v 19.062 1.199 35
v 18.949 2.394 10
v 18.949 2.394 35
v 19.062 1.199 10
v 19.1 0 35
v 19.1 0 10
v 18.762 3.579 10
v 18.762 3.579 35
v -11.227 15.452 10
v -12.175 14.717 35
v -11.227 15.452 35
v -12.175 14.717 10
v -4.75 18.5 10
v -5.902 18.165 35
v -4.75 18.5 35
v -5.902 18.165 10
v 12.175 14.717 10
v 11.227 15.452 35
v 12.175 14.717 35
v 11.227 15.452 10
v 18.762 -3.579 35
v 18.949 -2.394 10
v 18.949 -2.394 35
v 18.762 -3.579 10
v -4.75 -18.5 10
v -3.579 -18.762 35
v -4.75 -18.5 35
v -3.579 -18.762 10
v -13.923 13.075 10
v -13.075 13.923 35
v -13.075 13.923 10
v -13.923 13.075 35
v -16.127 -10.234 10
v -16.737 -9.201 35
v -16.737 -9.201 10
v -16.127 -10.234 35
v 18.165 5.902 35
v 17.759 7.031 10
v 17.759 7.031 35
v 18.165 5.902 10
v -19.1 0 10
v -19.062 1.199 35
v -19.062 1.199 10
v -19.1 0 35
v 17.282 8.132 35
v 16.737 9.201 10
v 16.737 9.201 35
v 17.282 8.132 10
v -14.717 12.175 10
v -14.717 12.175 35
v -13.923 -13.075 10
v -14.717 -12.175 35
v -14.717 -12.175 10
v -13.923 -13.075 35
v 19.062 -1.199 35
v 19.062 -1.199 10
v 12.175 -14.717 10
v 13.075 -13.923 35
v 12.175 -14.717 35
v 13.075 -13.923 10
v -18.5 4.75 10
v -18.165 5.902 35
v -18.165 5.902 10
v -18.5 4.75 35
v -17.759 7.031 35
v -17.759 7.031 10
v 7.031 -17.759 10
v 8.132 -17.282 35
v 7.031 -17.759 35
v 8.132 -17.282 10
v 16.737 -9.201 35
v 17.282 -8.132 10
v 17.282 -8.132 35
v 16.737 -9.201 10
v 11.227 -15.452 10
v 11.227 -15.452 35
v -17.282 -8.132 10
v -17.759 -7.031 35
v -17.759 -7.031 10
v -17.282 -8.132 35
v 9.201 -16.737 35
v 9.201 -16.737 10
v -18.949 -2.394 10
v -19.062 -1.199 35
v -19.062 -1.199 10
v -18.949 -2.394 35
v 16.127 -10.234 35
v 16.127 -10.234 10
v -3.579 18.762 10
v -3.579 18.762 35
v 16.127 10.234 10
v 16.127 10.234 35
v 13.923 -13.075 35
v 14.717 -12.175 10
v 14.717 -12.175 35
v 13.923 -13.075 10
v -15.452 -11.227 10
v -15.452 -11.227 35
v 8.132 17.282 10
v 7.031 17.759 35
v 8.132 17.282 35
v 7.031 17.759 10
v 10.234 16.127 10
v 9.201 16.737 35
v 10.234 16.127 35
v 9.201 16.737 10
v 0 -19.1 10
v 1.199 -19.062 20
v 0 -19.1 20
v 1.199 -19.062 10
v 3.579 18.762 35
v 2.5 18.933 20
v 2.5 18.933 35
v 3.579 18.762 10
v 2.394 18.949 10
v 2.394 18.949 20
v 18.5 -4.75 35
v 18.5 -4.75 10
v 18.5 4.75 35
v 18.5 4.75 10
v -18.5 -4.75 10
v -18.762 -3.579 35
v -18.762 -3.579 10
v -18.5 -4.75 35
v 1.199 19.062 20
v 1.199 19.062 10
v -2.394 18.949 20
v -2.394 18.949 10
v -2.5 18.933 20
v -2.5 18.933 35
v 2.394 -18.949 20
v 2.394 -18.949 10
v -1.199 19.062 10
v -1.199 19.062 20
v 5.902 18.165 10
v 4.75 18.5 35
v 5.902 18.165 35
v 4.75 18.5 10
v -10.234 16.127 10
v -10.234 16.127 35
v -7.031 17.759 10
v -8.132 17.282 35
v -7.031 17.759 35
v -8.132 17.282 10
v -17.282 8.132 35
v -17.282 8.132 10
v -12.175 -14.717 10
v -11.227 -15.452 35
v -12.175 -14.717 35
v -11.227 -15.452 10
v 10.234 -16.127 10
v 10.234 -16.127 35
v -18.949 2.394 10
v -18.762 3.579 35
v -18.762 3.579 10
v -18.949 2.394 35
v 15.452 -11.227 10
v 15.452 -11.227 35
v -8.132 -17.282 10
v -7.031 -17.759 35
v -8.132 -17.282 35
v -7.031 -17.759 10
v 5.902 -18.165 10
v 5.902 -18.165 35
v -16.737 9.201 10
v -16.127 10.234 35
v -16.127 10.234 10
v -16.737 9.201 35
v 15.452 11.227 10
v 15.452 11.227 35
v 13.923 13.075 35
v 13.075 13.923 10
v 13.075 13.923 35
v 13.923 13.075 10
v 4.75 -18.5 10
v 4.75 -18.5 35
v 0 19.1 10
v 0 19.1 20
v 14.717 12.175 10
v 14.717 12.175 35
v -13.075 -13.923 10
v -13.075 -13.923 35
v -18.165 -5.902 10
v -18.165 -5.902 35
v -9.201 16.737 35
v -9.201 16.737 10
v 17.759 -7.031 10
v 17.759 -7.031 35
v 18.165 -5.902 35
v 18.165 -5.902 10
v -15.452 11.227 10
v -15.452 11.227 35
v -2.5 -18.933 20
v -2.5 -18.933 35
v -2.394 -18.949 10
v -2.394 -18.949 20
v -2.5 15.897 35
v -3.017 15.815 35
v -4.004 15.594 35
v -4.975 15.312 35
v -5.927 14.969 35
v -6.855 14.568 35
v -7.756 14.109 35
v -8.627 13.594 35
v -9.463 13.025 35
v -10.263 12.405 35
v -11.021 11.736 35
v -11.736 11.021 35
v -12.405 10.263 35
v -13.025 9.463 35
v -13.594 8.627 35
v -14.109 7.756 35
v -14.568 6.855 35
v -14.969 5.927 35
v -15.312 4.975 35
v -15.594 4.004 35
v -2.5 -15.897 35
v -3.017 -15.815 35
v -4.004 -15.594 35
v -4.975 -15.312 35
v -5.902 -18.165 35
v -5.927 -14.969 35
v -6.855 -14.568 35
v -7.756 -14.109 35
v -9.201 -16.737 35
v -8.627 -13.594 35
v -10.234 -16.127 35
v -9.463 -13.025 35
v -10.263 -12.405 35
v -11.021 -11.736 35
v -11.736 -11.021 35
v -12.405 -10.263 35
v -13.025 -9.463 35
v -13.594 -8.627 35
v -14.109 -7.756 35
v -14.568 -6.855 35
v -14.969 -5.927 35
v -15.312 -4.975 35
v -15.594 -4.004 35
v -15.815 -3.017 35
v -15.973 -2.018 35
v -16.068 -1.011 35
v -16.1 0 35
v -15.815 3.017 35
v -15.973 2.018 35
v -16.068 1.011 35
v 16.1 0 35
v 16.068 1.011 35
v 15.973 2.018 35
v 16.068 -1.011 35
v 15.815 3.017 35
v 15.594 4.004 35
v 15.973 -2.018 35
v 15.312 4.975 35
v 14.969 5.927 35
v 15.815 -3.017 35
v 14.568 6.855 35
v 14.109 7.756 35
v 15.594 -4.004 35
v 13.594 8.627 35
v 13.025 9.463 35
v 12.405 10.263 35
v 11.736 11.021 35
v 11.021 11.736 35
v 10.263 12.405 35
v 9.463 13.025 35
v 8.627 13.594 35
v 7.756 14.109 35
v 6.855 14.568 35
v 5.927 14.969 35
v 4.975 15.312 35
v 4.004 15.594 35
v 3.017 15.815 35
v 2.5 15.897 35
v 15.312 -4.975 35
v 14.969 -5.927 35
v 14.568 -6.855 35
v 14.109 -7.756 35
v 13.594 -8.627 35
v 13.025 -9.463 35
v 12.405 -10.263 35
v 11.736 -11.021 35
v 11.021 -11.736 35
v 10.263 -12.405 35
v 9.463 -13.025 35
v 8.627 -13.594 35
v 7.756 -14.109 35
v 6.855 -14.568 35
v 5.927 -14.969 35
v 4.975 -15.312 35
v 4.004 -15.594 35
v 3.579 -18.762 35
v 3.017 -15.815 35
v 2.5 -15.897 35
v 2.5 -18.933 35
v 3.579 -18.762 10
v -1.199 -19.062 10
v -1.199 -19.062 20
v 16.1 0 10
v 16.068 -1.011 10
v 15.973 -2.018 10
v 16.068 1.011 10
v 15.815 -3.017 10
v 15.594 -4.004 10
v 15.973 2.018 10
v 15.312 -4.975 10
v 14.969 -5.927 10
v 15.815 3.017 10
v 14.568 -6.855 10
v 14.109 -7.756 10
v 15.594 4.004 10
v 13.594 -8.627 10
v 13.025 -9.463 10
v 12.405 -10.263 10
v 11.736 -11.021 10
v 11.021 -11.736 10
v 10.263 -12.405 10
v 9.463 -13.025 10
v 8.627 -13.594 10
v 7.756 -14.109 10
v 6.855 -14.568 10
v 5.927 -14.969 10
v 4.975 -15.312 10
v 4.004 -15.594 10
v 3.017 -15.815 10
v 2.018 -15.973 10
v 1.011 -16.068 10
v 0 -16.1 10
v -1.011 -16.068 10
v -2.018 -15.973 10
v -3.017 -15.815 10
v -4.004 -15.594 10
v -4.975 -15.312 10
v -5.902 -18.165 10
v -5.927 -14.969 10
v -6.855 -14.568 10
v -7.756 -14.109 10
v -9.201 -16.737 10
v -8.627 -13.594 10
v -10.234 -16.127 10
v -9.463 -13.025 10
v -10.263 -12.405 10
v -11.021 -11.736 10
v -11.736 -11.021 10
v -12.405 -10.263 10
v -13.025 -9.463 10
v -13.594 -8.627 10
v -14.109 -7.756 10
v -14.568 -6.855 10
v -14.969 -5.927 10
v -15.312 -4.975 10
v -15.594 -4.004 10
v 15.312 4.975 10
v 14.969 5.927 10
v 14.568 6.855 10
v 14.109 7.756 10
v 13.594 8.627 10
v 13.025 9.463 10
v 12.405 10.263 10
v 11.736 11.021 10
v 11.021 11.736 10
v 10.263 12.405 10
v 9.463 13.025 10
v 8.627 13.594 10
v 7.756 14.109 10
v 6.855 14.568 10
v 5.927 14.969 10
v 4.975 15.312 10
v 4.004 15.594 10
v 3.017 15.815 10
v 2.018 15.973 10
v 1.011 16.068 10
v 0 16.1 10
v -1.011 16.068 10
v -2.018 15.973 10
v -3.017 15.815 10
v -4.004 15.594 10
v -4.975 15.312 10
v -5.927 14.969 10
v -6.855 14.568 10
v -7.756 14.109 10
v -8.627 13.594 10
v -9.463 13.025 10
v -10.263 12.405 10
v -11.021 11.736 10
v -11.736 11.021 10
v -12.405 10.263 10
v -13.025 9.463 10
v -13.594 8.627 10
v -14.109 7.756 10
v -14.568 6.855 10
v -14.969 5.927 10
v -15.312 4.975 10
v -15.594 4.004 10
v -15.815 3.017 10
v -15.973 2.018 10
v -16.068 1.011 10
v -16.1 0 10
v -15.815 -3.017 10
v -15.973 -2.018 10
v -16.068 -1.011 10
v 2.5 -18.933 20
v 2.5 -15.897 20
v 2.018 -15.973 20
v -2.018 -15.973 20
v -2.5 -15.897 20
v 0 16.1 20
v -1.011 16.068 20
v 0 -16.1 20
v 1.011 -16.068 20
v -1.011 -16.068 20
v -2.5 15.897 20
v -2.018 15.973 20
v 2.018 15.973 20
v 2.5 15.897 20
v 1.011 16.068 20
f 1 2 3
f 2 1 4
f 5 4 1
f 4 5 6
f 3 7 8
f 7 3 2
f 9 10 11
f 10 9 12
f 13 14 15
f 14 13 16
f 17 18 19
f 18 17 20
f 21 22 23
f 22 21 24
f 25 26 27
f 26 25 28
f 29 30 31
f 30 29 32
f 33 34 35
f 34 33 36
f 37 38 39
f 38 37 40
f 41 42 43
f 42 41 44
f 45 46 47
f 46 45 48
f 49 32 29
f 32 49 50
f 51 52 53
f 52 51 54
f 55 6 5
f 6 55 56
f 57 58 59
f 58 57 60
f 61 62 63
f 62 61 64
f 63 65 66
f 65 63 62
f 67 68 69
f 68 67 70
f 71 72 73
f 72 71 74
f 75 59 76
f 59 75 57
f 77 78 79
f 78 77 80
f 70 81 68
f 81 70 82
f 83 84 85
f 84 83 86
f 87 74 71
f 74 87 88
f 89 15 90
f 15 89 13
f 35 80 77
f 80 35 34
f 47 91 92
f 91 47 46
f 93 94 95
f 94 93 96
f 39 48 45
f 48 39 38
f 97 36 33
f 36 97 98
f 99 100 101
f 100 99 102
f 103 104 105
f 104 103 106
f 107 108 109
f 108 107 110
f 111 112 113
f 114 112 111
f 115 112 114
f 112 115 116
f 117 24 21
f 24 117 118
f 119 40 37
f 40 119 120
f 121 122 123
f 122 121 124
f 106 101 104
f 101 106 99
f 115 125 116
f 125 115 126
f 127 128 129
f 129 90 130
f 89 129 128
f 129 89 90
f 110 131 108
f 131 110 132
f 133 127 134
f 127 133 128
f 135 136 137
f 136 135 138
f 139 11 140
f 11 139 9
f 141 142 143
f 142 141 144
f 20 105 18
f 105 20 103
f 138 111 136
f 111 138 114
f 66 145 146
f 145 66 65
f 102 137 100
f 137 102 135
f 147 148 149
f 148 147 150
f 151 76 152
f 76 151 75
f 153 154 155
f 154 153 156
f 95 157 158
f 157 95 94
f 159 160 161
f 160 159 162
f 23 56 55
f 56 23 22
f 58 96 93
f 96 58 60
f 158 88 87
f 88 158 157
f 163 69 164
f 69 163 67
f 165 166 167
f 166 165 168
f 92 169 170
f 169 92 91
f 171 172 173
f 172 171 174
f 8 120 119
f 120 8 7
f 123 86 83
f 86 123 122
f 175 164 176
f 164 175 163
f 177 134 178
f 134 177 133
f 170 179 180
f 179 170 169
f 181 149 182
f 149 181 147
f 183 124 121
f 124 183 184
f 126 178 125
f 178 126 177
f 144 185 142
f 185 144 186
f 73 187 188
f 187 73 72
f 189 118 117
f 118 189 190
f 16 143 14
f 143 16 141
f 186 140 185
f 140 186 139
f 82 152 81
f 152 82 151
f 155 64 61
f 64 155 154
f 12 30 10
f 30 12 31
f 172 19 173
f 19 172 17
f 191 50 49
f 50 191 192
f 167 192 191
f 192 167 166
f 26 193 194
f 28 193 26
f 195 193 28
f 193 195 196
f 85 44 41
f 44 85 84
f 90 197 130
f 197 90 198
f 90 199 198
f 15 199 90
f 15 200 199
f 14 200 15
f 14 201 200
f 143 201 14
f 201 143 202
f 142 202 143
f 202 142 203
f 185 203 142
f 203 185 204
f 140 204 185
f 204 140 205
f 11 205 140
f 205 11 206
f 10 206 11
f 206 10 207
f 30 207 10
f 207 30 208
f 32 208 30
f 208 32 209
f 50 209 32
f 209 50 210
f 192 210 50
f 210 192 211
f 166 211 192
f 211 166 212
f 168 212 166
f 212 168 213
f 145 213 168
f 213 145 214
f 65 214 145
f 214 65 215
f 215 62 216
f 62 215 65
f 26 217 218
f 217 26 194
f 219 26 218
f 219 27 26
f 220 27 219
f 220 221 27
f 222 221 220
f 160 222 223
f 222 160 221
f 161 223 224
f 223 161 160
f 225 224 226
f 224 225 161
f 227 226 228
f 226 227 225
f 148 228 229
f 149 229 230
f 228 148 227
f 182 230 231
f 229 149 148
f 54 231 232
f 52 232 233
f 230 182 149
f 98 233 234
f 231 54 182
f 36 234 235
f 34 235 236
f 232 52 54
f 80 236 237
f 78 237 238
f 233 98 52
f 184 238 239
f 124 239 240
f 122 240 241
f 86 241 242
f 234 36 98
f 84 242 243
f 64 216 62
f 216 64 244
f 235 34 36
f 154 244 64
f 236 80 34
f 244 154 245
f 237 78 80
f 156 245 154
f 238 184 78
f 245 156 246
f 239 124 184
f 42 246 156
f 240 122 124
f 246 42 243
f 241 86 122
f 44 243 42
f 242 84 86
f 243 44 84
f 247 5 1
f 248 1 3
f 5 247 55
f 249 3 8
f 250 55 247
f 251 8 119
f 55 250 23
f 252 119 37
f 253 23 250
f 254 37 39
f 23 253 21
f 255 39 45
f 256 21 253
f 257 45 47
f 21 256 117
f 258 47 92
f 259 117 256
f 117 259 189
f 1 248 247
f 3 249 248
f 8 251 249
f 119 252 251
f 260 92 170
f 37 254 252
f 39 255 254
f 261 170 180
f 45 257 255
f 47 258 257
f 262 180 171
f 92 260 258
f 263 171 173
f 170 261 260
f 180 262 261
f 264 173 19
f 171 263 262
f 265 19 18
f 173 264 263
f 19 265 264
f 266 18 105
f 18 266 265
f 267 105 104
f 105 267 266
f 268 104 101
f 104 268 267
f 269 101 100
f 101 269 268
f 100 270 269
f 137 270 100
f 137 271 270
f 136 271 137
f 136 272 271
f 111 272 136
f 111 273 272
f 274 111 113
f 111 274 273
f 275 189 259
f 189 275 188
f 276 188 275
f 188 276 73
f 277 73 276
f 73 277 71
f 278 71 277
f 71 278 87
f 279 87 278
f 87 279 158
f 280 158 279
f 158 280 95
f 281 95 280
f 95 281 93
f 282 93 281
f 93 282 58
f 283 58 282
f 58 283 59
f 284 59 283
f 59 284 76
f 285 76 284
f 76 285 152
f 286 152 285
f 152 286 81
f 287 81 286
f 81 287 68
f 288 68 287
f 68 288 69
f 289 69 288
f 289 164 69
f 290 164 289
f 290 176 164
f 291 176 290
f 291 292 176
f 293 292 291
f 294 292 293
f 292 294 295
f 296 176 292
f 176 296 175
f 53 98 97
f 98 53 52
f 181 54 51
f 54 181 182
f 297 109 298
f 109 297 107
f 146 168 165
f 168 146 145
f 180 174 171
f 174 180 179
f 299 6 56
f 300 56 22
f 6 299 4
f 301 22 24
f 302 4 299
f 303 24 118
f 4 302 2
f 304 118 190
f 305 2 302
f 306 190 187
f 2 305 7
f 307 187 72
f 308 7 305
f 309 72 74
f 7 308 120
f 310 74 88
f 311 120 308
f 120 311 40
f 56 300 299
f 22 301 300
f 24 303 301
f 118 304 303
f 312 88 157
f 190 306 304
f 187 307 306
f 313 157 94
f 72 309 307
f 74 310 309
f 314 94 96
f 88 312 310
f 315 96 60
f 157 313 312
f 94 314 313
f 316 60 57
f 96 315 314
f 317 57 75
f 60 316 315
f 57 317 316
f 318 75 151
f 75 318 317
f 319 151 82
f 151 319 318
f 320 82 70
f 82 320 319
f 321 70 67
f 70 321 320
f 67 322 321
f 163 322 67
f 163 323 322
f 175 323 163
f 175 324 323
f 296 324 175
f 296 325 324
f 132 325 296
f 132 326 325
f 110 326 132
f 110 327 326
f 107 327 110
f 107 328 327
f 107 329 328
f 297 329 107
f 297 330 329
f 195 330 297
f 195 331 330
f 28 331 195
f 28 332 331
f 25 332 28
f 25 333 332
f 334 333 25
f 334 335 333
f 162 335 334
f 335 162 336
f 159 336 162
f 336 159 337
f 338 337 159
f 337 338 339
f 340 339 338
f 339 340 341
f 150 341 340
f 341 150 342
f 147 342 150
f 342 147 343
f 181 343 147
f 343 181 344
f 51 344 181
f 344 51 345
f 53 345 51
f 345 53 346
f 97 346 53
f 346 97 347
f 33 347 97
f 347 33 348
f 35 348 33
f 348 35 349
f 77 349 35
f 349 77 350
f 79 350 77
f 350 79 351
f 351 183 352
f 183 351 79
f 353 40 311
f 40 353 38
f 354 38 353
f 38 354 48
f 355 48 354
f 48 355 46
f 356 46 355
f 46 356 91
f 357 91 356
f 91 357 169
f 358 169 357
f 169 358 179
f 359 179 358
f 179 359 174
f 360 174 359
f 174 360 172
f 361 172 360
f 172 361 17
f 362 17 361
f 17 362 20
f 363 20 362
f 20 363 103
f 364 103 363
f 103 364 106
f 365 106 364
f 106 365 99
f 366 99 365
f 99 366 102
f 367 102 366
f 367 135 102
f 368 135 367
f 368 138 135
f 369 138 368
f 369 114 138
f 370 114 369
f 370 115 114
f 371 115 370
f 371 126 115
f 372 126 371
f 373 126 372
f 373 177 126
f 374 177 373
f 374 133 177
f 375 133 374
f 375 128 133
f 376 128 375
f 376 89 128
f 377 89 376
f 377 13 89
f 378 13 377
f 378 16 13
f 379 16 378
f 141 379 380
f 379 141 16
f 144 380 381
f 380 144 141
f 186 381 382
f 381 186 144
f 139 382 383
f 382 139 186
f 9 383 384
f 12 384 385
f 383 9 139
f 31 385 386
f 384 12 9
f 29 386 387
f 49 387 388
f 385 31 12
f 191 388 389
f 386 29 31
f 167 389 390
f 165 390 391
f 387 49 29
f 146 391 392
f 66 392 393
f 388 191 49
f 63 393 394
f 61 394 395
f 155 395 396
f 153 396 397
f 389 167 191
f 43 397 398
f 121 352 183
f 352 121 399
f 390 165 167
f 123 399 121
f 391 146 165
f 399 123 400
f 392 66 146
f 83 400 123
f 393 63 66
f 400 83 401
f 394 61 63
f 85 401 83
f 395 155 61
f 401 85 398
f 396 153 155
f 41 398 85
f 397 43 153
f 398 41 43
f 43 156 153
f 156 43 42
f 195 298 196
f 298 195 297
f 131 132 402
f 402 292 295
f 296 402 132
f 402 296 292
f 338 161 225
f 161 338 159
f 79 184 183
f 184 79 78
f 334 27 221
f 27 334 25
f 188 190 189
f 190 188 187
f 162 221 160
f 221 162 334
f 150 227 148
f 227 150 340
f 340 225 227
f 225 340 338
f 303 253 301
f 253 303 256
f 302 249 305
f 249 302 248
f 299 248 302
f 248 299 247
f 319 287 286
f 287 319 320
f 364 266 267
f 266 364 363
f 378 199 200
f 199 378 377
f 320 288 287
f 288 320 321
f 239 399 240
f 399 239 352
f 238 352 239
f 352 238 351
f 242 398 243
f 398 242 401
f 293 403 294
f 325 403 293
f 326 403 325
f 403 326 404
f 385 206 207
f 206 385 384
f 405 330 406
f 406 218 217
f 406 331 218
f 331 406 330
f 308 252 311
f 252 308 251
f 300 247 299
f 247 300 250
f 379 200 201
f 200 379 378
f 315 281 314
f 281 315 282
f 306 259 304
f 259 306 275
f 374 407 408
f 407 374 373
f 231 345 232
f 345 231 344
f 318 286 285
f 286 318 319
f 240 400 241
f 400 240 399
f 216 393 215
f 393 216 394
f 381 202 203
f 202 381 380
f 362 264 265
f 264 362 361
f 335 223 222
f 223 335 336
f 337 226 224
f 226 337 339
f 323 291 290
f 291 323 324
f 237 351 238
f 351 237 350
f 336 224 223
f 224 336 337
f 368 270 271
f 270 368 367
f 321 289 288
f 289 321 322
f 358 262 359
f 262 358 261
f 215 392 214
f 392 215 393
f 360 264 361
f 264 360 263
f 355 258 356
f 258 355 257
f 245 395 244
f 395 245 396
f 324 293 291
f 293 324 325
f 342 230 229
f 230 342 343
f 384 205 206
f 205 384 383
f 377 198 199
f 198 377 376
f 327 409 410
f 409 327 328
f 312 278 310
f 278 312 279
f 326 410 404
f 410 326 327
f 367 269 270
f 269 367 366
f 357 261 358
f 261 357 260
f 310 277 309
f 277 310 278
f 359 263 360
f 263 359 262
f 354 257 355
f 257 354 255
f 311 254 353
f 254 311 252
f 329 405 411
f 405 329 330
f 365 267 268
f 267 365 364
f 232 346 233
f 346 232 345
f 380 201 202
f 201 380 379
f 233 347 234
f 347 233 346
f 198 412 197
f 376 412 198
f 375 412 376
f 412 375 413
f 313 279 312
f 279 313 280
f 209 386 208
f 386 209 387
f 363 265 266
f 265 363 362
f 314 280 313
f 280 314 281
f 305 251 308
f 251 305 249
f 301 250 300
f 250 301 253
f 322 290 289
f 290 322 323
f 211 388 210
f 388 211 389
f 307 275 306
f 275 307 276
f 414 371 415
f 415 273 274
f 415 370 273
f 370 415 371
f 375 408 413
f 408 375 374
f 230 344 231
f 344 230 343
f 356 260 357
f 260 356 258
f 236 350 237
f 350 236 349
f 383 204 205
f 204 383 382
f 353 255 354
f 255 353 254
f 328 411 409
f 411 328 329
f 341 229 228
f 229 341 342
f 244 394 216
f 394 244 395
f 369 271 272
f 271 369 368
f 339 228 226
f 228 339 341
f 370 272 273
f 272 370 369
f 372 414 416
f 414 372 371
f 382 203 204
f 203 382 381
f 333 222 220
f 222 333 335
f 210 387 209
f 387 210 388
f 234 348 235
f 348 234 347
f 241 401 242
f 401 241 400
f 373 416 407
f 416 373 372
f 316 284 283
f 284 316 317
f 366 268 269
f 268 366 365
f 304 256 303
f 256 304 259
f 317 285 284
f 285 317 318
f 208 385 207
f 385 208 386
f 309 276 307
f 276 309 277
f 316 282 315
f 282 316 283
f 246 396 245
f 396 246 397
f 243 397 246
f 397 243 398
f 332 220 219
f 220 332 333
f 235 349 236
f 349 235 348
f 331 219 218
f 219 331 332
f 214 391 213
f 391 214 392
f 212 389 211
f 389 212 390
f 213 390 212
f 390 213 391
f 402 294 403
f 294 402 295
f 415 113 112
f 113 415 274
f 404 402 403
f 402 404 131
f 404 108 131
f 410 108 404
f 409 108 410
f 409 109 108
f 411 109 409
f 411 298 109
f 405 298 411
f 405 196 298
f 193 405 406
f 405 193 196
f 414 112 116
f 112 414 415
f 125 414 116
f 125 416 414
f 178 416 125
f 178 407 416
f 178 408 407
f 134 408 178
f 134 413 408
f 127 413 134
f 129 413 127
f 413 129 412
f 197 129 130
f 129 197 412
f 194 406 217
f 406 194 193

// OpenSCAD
/*
female box adapter for the 3D-PAWS station assembly

Created by Martin Steinsen

Updated 5/28/25 with comments by WTN
*/


// ================ PARAMETERS ======================
$fn=100;
fitting_or=16.1; //1" pvc = 16.9, 32mm pvc = 16.3

// ================ MODULE ==========================

module box_adptr_fem(){
    
    //nut to give threads
    //scale([1.1,1.1,1])import("box to pipe adaptor nut2.stl");
    
    //pipe or fitting size for clamp
    translate ([0,0,10]) difference () {
        cylinder(25,fitting_or+3,fitting_or+3);
        translate([0,0,-1]) cylinder(55,fitting_or,fitting_or);
        translate ([-2.5,-40,10]) cube ([5,80,25]);
        }
    /*inner stop
    translate ([0,0,13]) difference () {
        cylinder(3,fitting_or,fitting_or);
        translate([0,0,-1]) cylinder(55,fitting_or-2,fitting_or-2);}
        */
}

// ================ DISPLAY ==========================
box_adptr_fem();
